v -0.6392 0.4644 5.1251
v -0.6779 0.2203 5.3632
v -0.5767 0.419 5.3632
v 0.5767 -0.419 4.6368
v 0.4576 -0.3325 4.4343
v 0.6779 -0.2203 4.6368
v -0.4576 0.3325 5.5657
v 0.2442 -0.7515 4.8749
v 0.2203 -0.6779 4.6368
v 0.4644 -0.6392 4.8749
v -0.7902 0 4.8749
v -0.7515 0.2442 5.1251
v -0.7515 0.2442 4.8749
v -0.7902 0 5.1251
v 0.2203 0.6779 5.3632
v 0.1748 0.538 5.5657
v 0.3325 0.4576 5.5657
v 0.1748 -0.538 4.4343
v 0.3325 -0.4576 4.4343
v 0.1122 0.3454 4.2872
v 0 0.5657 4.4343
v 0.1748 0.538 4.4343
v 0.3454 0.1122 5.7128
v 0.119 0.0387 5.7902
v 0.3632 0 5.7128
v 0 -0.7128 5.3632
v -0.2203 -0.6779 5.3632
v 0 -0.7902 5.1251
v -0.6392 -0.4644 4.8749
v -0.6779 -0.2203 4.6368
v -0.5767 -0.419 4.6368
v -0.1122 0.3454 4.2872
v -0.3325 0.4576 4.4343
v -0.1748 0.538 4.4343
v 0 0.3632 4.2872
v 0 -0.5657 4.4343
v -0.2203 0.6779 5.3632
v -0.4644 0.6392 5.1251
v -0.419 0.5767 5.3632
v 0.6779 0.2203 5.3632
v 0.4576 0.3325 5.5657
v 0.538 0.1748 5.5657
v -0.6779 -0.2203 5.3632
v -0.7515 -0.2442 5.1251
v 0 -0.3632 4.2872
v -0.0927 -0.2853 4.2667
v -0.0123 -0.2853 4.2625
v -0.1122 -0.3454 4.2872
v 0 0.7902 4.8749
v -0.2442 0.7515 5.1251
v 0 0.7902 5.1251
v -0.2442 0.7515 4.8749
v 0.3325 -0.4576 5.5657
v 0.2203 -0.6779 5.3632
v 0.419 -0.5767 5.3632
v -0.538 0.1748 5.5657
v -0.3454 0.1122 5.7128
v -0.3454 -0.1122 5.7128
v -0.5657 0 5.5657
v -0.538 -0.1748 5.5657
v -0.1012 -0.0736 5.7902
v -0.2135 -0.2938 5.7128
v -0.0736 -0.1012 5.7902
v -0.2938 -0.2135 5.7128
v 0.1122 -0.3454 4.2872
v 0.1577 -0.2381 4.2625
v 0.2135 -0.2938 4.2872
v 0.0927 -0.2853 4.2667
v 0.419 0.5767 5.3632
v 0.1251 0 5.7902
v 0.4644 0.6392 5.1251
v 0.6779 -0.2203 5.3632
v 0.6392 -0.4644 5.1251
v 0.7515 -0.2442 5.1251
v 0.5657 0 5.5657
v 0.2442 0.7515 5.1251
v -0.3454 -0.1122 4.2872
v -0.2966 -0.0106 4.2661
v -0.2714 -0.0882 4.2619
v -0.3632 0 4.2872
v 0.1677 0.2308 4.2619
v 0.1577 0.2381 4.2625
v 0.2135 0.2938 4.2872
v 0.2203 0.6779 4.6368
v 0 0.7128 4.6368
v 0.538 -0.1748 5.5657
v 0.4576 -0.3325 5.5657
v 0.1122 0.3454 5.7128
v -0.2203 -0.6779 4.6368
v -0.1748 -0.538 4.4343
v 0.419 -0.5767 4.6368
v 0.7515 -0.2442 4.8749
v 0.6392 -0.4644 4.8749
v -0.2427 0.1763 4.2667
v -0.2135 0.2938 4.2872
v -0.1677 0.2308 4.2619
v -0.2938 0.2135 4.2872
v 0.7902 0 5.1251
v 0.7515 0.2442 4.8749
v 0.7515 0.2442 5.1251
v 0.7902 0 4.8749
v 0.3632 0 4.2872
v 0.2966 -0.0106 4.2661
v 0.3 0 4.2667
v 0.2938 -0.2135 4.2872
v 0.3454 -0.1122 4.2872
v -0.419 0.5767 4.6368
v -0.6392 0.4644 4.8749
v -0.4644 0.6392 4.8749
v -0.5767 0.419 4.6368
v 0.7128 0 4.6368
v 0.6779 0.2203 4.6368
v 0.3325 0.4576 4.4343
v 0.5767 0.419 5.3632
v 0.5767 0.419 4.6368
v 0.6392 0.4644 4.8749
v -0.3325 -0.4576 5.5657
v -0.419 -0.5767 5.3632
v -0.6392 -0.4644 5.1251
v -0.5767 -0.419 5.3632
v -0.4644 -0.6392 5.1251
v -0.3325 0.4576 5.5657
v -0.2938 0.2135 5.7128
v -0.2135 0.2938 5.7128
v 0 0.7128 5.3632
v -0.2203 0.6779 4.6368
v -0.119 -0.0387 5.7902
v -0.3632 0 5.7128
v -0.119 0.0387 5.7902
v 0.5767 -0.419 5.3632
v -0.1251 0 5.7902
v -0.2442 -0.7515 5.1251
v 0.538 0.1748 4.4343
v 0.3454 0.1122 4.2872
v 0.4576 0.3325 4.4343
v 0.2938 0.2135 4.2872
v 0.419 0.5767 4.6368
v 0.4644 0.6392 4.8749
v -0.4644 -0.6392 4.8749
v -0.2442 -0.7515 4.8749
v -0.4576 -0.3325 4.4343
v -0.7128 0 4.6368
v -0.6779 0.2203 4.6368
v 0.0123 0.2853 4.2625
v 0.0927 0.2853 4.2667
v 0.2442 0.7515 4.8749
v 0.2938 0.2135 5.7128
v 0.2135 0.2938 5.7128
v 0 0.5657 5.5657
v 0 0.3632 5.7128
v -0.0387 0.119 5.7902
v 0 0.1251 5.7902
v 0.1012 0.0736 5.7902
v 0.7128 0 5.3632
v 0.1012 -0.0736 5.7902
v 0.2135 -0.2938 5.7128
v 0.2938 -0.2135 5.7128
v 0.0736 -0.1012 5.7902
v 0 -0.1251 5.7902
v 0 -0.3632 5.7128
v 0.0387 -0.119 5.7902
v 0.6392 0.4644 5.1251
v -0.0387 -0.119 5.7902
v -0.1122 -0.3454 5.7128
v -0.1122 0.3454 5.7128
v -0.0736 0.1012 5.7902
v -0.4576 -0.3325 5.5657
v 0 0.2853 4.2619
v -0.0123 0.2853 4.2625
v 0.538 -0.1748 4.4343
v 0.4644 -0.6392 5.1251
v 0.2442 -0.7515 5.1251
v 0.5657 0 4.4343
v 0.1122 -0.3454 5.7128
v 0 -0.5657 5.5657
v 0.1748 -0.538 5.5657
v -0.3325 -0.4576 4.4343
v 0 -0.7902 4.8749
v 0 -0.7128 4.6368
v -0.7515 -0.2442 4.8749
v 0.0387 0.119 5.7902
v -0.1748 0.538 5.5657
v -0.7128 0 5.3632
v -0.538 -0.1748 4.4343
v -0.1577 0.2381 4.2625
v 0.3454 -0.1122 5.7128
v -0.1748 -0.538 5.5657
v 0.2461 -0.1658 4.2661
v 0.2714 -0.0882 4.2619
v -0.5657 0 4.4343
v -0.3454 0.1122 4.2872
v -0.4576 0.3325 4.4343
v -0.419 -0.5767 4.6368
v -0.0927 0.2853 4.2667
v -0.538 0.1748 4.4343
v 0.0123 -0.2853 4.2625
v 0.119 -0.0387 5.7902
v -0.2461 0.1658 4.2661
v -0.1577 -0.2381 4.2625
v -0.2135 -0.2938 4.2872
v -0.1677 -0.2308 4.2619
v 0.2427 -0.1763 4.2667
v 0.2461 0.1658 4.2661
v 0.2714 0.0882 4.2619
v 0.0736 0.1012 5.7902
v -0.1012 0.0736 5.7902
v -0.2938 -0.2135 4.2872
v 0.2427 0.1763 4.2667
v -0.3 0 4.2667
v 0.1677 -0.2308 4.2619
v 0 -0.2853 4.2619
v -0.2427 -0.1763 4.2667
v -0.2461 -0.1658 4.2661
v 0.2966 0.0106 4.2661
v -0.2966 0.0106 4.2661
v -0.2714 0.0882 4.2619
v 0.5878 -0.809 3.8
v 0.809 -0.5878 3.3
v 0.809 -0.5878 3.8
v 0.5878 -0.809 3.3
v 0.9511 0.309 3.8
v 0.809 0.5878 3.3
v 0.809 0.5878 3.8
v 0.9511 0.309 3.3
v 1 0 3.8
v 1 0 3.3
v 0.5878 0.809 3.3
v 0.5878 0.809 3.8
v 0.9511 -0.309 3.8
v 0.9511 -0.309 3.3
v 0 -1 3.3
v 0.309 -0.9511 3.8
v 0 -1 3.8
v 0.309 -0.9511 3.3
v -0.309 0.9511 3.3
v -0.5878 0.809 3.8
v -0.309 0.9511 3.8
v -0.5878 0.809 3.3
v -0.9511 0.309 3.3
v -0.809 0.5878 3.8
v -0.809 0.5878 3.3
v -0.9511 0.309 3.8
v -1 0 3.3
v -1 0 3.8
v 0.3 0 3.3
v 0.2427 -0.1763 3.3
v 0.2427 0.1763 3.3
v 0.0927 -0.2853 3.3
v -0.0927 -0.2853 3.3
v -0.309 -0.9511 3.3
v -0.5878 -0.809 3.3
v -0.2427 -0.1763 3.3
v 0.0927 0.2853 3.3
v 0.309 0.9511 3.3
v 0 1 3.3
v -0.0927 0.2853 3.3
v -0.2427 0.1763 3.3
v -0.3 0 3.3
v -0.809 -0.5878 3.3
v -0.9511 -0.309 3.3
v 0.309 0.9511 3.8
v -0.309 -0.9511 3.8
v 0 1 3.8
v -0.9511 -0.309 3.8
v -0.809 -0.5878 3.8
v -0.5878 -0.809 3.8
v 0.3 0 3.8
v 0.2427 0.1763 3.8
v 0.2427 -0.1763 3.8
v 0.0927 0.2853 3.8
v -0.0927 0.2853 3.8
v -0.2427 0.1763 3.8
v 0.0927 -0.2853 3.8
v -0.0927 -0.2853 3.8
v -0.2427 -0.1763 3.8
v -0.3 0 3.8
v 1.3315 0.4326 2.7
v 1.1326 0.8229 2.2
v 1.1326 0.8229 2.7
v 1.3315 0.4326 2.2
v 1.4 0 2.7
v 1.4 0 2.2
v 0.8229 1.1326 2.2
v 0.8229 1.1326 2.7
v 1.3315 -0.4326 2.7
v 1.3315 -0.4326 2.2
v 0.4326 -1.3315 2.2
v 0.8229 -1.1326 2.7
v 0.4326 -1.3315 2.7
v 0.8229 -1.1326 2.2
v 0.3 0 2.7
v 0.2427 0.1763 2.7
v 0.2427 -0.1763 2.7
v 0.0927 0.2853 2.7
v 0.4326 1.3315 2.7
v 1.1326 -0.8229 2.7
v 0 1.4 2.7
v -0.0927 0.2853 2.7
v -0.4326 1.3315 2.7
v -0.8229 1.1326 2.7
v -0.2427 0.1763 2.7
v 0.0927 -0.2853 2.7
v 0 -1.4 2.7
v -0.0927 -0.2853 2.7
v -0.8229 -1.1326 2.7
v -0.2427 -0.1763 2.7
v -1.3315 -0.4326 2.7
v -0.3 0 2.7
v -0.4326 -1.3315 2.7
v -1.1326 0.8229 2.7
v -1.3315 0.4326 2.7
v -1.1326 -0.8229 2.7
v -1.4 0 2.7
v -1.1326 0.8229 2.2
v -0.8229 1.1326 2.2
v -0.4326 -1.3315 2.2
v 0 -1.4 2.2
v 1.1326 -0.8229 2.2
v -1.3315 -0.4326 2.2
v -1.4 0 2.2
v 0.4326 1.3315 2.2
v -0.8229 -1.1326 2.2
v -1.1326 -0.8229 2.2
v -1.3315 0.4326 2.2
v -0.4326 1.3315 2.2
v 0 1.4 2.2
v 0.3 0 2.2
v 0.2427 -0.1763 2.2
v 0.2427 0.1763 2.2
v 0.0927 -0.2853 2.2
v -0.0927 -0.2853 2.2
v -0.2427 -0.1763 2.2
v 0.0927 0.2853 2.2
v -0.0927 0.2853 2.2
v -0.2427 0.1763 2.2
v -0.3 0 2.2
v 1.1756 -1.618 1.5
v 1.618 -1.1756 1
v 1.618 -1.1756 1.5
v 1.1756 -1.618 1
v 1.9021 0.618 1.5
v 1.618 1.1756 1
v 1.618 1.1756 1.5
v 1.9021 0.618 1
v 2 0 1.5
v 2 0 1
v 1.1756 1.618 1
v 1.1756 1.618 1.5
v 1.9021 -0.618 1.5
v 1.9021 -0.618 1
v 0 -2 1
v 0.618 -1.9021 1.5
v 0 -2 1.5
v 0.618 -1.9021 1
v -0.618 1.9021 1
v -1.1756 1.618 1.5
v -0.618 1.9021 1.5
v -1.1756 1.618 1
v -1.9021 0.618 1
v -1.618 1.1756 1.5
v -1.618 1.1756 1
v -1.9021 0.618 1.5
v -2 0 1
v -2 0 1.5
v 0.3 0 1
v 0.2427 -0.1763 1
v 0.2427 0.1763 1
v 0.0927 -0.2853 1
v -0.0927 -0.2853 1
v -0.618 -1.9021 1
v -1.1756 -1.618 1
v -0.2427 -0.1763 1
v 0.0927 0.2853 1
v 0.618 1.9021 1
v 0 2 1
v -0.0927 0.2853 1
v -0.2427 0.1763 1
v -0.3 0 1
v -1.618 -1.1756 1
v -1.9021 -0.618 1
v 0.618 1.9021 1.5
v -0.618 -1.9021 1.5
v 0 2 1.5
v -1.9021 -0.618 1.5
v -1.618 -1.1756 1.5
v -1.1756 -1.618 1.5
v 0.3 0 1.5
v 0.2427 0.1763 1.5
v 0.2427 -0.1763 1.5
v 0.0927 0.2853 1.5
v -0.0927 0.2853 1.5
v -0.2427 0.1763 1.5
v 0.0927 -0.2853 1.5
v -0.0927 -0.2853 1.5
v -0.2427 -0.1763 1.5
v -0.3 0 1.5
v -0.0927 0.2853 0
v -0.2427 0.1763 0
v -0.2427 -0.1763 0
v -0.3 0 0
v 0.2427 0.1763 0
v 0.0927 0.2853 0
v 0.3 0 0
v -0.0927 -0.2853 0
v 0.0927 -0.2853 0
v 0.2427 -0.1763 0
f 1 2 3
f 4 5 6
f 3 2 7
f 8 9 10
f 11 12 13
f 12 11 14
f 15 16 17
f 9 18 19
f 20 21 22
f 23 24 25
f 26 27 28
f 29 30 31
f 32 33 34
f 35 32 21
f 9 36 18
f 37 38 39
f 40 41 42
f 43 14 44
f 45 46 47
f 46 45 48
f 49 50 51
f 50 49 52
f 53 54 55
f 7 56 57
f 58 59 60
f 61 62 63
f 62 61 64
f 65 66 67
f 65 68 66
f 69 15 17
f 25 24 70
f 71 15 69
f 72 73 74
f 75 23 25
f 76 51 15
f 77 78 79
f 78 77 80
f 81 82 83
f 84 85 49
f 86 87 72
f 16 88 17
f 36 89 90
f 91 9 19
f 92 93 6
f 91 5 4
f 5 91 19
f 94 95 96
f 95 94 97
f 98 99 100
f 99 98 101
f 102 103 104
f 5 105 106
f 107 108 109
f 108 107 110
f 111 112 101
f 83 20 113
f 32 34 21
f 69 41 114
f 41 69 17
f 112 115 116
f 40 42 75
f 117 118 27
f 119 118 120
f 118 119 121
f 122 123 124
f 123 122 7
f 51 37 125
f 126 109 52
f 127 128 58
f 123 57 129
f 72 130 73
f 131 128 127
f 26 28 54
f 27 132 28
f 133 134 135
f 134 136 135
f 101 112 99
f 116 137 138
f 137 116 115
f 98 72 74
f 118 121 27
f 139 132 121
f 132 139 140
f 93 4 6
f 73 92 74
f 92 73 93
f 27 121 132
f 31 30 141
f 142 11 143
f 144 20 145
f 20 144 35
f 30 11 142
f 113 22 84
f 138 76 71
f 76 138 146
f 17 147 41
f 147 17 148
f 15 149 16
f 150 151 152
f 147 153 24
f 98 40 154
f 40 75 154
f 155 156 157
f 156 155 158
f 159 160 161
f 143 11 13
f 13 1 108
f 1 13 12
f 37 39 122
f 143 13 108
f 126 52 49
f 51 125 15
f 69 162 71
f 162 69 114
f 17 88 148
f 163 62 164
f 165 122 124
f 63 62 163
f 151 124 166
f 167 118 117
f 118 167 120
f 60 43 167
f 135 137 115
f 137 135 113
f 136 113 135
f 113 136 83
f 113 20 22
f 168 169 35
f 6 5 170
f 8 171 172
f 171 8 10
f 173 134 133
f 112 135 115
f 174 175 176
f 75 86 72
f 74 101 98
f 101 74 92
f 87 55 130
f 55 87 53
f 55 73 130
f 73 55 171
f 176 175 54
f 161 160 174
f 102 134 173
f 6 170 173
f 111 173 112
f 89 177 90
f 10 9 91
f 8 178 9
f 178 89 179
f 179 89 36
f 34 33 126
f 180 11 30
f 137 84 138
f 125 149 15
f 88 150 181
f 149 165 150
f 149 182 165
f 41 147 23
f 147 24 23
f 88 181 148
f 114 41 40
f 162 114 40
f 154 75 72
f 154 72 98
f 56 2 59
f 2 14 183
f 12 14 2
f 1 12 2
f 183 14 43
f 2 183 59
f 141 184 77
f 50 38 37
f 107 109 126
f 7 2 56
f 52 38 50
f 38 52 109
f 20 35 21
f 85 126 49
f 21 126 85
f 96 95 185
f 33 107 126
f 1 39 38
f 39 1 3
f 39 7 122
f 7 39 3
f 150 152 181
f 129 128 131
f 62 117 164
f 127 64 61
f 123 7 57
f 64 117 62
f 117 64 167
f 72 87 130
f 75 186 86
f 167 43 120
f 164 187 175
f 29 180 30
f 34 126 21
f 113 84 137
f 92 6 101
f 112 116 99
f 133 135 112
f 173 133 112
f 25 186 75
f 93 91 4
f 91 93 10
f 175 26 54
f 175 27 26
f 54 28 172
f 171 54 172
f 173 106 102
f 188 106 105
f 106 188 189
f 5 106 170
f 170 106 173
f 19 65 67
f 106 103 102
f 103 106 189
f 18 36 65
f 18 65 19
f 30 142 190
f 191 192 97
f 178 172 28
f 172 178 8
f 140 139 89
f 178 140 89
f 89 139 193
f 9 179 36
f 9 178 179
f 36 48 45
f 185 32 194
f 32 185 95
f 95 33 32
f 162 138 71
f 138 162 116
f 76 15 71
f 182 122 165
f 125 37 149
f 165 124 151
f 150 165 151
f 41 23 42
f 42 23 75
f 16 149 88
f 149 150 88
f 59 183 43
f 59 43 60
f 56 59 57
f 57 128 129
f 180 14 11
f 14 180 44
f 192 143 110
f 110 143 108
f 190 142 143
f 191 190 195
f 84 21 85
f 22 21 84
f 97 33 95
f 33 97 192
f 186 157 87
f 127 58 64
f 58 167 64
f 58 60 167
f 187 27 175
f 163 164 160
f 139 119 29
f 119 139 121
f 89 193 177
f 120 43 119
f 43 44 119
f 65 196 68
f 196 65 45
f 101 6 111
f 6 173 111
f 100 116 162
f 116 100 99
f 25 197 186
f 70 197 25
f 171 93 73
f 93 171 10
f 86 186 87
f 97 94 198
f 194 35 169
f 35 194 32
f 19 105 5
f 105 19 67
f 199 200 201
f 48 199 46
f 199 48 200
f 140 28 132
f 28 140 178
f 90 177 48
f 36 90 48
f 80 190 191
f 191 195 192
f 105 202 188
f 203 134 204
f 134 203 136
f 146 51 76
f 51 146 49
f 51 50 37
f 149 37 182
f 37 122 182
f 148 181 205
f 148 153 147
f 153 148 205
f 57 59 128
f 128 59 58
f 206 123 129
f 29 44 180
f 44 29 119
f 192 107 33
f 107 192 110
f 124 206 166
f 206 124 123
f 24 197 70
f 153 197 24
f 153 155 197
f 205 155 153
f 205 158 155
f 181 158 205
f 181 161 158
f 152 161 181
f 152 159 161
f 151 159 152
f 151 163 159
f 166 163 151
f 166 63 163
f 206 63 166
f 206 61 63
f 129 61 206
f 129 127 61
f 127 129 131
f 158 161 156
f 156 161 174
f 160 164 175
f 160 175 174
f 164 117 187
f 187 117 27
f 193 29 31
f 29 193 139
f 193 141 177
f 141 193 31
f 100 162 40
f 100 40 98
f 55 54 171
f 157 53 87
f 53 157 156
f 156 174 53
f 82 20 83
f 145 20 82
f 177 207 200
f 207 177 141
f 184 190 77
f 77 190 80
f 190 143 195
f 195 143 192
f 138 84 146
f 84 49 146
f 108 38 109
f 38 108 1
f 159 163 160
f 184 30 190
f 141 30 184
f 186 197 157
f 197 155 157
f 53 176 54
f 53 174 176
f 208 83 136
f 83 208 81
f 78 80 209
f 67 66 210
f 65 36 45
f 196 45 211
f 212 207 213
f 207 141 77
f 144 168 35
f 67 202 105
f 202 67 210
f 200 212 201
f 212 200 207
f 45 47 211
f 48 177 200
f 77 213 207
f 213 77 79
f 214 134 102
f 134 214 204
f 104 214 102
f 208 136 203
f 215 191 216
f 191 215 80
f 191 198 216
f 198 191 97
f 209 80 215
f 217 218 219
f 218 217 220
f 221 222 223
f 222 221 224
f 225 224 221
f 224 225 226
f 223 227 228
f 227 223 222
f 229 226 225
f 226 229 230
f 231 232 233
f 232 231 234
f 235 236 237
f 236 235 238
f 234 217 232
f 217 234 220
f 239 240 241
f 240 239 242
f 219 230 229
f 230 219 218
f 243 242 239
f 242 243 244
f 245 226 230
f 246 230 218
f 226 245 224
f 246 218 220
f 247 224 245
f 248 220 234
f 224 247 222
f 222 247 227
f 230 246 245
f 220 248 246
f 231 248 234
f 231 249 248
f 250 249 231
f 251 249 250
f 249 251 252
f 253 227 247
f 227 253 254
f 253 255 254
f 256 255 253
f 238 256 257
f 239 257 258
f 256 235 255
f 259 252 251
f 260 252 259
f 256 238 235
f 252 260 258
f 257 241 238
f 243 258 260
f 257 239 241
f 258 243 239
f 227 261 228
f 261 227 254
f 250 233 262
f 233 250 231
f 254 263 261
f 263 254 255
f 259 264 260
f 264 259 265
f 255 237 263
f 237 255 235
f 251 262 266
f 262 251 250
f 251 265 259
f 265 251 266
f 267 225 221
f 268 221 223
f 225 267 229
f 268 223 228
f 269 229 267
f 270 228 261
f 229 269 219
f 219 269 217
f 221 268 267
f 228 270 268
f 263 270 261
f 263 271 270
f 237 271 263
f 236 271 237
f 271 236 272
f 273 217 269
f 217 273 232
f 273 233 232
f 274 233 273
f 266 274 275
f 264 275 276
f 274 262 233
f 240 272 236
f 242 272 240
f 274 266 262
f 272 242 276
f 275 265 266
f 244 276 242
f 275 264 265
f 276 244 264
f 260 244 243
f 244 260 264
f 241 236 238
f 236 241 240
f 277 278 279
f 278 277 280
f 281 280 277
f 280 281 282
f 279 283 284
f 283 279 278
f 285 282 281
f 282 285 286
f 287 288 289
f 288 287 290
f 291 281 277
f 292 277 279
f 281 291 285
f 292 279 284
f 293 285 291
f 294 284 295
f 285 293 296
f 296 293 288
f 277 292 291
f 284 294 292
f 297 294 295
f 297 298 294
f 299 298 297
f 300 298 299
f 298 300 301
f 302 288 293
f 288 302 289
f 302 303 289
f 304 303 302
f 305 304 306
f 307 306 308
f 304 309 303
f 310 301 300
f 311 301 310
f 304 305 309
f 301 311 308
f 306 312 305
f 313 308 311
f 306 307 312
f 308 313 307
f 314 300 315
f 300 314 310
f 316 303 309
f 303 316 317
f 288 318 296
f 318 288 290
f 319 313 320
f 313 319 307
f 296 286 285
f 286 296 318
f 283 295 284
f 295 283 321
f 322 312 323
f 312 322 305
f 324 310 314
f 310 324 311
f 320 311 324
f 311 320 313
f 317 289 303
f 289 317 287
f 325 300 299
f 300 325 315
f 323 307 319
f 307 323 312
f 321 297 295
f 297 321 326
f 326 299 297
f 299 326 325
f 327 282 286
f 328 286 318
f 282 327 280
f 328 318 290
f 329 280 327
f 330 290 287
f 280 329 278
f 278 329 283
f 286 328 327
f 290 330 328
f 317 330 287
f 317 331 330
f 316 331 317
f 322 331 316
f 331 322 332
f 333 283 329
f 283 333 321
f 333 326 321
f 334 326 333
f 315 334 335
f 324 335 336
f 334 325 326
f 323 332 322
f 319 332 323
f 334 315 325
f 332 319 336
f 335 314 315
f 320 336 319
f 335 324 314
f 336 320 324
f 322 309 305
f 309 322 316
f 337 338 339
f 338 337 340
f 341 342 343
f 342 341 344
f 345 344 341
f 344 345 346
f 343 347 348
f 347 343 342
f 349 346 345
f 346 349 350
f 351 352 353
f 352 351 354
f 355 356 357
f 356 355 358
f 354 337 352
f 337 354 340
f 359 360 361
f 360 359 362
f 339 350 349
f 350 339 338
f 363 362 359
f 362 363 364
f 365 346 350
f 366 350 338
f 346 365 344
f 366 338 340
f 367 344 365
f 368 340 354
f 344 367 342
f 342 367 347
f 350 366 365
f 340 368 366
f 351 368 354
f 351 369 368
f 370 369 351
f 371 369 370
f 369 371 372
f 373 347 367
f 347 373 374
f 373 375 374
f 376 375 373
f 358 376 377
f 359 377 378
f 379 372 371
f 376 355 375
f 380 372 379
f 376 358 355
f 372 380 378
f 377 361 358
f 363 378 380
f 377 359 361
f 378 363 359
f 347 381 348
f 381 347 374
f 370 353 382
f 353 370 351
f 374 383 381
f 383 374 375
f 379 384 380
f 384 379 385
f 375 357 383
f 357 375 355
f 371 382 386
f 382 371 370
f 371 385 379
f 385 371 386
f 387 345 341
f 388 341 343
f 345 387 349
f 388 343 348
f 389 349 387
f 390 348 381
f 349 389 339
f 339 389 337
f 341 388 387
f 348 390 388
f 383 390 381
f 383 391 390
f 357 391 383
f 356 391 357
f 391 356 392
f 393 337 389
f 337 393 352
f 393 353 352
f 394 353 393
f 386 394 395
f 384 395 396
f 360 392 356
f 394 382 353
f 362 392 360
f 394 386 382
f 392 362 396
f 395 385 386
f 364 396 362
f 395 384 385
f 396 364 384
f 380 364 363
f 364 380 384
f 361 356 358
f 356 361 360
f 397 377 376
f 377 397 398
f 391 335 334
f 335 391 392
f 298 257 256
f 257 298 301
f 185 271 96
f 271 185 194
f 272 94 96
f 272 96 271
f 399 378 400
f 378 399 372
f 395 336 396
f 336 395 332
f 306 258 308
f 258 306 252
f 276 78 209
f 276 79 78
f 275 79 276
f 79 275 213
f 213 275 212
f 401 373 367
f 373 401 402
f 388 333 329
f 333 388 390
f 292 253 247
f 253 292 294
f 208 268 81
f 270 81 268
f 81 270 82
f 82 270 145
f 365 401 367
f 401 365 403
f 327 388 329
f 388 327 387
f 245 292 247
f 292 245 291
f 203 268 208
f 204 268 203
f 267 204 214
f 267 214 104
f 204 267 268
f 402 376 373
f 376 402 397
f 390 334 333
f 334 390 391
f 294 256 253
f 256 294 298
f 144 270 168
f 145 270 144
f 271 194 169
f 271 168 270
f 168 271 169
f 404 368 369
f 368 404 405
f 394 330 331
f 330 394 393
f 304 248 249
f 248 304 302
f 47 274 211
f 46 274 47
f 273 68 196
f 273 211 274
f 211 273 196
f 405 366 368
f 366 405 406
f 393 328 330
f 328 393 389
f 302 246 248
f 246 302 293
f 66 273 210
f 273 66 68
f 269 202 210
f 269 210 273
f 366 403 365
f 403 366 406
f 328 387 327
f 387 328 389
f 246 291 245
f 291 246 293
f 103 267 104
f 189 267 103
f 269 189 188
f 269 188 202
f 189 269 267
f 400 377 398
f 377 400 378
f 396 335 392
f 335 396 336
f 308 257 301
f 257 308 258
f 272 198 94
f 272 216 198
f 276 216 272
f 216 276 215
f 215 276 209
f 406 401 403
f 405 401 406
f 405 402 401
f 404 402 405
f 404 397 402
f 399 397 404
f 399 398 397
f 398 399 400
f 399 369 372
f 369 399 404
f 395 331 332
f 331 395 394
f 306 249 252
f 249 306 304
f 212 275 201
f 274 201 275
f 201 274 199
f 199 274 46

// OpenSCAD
color("Yellow")
translate([0,0,5])
sphere(0.8,$fn=20);

color("LightGreen")
translate([0,0,3.3])
cylinder(0.5, 1, 1, $fn=20);

color("MediumSeaGreen")
translate([0,0,2.2])
cylinder(0.5, 1.4, 1.4, $fn=20);

color("DarkGreen")
translate([0,0,1])
cylinder(0.5, 2, 2, $fn=20);

color("Orange")
cylinder(5, 0.3, 0.3, $fn=10);
